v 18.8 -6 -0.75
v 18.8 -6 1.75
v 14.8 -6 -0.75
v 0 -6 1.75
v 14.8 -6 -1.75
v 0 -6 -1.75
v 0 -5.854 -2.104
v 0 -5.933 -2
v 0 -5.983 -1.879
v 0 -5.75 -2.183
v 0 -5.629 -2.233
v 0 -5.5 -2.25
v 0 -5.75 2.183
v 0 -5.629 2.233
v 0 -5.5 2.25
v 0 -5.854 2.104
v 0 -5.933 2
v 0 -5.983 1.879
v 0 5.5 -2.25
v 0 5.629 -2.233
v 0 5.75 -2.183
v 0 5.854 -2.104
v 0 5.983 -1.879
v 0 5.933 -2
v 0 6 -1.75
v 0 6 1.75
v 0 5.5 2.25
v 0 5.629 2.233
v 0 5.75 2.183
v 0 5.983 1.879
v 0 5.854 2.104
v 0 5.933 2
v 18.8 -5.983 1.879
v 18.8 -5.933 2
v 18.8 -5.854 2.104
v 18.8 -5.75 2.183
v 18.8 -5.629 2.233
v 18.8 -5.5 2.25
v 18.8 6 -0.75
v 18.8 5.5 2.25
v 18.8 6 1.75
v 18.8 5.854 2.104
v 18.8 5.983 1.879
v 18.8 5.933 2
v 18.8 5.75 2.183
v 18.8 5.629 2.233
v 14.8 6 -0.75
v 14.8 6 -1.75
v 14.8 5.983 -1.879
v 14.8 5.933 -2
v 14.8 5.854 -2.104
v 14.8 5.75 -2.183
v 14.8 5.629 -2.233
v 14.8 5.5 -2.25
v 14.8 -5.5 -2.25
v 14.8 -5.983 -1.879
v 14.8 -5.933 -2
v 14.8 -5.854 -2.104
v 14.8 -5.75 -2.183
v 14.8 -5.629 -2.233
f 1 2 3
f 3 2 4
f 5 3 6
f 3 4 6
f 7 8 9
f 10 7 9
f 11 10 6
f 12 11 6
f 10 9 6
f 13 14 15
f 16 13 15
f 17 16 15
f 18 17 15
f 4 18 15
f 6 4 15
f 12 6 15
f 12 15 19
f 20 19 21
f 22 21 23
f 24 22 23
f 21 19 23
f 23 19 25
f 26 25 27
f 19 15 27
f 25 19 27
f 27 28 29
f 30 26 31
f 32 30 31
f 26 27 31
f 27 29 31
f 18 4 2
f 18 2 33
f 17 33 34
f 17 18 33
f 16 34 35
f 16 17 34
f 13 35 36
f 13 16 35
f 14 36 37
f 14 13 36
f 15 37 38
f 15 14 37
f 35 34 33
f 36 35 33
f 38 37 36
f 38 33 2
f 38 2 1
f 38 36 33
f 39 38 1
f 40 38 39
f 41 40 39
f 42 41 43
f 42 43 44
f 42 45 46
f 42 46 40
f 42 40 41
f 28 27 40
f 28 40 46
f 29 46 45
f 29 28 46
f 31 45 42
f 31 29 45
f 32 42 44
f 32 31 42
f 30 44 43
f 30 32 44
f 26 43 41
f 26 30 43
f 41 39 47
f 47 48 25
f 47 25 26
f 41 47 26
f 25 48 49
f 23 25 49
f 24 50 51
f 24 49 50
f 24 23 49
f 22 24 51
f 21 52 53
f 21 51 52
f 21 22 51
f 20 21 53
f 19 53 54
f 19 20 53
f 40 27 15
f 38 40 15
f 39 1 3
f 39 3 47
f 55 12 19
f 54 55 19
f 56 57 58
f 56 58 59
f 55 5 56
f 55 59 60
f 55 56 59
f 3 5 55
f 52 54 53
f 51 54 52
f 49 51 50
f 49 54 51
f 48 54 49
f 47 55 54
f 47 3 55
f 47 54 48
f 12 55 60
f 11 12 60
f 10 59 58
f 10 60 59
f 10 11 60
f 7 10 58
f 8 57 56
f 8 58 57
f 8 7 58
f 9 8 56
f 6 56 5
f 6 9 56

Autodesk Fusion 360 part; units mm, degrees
sketch "Sketch1" plane through (0, 0, 0) normal (1, 0, 0) x (0, 1, 0)
  line L0 (5.5, 2.25) -> (-5.5, 2.25)
  line L1 (-6, 1.75) -> (-6, -1.75)
  line L2 (-5.5, -2.25) -> (5.5, -2.25)
  line L3 (6, -1.75) -> (6, 1.75)
  line L4 (6, 2.25) -> (-6, -2.25) construction
  line L5 (-6, 2.25) -> (6, -2.25) construction
  arc A0 (-5.5, 2.25) -> (-6, 1.75) centre (-5.5, 1.75) ccw
  arc A1 (-6, -1.75) -> (-5.5, -2.25) centre (-5.5, -1.75) ccw
  arc A2 (6, 1.75) -> (5.5, 2.25) centre (5.5, 1.75) ccw
  arc A3 (5.5, -2.25) -> (6, -1.75) centre (5.5, -1.75) ccw
  dimension "d1" = 12
  dimension "d2" = 4.5
  dimension "d3" = 0.5
  dimension "d4" = 0.5
  dimension "d5" = 0.5
  dimension "d6" = 0.5
extrude "Extrude1" add sketch "Sketch1" along normal blind 18.8
sketch "Sketch2" plane through (18.8, 0, 0) normal (1, 0, 0) x (0, 1, 0)
  arc A0 (5.5, -2.25) -> (6, -1.75) centre (5.5, -1.75) ccw
  line L0 (6, -1.75) -> (6, 1.75)
  arc A1 (6, 1.75) -> (5.5, 2.25) centre (5.5, 1.75) ccw
  line L1 (5.5, 2.25) -> (-5.5, 2.25)
  arc A2 (-5.5, 2.25) -> (-6, 1.75) centre (-5.5, 1.75) ccw
  line L2 (-6, 1.75) -> (-6, -1.75)
  arc A3 (-6, -1.75) -> (-5.5, -2.25) centre (-5.5, -1.75) ccw
  line L3 (-5.5, -2.25) -> (5.5, -2.25)
  line L4 (0, 2.25) -> (0, -0.75)
  line L5 (0, -0.75) -> (6, -0.75)
  line L6 (6, -0.75) -> (6, -2.25)
  line L7 (6, -2.25) -> (0, -2.25)
  line L8 (0, -2.25) -> (0, -0.75)
  line L9 (0, -0.75) -> (-6, -0.75)
  line L10 (-6, -0.75) -> (-6, -2.25)
  line L11 (-6, -2.25) -> (0, -2.25)
  line L12 (0, -2.25) -> (0, -0.75)
  dimension "d9" = 3
extrude "Extrude2" cut sketch "Sketch2" against normal blind 4 contours A0 L0 L3 L5 L6 L7 L8 L12 | L2 A3 L3 L8 L9 L10 L11 L12
